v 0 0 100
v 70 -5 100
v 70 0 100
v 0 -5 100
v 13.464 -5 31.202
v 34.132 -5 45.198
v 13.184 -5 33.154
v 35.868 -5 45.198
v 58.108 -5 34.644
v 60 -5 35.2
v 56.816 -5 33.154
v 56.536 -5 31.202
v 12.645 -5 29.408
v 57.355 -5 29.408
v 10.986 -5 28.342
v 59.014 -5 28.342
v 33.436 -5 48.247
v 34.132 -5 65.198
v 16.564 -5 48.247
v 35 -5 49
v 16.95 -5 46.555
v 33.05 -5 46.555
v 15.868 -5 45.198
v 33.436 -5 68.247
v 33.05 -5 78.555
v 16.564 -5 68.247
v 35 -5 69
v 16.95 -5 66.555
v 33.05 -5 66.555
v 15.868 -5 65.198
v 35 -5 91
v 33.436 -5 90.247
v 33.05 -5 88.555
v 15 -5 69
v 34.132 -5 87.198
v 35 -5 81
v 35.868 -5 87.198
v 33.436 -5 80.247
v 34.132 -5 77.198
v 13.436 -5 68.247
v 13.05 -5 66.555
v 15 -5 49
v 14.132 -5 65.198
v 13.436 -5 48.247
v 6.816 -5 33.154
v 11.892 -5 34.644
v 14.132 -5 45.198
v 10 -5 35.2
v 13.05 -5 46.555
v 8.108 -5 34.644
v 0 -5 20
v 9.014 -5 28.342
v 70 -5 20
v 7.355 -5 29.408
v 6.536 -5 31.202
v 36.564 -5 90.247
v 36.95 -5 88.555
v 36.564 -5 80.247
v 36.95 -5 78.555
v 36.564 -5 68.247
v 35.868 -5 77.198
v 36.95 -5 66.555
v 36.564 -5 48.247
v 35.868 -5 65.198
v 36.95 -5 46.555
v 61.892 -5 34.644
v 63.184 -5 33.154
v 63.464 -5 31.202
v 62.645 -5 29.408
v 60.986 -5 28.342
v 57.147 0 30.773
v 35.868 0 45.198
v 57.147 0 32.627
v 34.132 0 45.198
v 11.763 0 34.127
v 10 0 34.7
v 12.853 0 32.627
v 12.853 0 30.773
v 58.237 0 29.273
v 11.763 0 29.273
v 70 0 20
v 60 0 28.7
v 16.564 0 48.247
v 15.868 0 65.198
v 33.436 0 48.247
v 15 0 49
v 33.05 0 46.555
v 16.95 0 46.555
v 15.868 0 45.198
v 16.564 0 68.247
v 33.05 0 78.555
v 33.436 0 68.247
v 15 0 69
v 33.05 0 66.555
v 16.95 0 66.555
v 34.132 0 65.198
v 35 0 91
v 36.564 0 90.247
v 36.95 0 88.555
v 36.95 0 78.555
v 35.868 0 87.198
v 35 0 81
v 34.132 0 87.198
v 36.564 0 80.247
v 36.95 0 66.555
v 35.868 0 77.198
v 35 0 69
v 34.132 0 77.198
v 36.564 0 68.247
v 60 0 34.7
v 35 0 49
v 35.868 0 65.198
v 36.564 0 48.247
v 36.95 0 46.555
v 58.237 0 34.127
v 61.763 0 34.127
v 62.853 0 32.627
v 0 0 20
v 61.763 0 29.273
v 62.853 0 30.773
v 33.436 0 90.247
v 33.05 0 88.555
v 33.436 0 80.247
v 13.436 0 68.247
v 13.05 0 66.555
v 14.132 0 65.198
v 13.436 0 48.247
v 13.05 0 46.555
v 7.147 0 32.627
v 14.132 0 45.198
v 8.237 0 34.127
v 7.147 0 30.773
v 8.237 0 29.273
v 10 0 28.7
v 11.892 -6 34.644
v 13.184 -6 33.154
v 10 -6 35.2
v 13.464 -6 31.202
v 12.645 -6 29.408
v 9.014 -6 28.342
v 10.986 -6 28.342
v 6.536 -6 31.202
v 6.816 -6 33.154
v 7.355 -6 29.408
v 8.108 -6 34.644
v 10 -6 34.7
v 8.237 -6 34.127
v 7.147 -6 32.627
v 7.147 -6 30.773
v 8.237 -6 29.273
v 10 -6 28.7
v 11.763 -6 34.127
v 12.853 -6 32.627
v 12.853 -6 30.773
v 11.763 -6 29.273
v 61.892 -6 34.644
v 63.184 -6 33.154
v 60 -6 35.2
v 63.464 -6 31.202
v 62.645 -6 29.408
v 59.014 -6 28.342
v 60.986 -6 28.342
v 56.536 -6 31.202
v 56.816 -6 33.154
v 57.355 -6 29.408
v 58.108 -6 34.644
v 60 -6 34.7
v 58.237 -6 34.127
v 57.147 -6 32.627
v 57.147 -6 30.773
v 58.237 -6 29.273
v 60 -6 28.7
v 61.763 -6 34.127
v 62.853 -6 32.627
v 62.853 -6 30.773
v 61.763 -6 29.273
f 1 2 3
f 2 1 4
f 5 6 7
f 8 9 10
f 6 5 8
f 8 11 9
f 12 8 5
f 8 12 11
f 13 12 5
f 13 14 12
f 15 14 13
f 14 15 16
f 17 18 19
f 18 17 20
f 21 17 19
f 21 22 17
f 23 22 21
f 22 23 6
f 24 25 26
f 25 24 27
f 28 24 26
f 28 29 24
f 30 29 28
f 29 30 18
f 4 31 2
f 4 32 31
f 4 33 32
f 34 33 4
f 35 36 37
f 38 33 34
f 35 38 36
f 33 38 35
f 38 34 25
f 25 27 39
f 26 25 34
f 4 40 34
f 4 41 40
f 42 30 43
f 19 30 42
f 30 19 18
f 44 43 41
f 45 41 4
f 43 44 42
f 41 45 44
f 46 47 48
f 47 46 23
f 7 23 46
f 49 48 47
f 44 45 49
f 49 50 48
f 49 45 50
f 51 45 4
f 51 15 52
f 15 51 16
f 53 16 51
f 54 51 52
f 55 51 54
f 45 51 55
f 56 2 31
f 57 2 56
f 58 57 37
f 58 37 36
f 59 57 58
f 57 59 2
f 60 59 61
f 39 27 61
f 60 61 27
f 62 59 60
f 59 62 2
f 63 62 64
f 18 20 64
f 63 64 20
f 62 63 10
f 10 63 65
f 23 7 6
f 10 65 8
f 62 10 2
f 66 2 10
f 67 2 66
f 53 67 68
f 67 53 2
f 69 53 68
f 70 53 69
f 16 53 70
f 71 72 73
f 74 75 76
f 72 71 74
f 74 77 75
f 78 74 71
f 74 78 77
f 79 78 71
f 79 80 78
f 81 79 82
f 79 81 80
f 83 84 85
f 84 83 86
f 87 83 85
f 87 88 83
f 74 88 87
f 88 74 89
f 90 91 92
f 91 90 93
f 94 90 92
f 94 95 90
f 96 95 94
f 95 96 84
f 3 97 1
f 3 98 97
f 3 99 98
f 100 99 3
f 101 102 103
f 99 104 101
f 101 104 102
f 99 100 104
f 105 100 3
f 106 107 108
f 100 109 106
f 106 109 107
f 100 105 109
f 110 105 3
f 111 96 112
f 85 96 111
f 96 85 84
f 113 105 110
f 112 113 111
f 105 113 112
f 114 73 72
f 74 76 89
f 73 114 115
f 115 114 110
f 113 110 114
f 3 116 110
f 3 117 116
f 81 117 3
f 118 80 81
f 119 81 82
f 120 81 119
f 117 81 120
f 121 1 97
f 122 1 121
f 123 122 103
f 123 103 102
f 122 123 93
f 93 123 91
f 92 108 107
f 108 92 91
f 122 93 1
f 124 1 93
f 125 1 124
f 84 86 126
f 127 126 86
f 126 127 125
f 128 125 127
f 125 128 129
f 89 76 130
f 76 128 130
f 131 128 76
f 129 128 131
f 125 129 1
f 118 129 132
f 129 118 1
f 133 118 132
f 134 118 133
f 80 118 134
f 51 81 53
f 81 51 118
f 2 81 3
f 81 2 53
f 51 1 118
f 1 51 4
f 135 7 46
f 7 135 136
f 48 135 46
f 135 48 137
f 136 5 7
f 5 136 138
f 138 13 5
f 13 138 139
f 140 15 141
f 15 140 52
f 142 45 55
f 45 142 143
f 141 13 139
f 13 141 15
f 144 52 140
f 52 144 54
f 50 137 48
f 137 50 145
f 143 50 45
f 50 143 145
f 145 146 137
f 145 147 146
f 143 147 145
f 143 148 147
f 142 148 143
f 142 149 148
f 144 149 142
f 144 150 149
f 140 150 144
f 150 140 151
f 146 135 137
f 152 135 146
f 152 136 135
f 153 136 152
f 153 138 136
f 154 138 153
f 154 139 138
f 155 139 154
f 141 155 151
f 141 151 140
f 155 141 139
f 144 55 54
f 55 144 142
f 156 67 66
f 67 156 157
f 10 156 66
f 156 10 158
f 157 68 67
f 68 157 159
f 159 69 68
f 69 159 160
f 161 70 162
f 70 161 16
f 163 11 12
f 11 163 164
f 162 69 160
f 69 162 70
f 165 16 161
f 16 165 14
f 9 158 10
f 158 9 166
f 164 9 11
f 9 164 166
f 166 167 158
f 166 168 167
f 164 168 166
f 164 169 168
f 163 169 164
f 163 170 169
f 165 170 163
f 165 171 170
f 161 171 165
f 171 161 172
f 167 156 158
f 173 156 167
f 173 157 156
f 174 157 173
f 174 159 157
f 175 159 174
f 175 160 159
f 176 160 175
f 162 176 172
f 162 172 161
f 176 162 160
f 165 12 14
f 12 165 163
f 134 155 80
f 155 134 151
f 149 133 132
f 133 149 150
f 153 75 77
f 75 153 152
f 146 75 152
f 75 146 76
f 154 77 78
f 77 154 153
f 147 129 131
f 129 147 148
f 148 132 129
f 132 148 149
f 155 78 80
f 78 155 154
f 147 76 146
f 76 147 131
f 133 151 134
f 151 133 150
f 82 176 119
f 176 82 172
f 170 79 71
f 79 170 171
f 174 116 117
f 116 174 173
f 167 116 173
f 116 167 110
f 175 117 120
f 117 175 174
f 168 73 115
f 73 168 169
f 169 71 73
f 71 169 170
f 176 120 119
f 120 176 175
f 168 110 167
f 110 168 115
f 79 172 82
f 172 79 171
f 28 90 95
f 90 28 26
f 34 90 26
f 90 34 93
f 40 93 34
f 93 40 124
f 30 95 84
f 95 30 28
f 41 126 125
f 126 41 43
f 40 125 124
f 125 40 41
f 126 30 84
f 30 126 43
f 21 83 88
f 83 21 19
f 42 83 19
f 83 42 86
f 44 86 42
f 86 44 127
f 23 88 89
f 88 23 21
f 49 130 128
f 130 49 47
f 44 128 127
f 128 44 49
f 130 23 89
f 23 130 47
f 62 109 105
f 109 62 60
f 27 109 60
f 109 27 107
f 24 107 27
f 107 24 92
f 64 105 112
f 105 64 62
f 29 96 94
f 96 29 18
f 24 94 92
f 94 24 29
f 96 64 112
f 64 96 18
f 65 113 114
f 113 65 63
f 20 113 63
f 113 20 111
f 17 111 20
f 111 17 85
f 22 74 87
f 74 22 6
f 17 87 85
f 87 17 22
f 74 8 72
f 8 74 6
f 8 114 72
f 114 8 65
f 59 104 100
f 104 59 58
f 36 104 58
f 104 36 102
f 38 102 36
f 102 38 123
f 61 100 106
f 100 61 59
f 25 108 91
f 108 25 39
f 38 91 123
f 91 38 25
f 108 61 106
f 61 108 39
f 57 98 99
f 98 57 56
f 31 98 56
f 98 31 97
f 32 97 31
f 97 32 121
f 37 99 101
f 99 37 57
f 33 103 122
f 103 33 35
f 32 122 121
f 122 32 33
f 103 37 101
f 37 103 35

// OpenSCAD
module motorBlock()
{
    // motor holder red side
difference()
{
     
    union() 
    {
        
        
        translate([-42,0,20])
        cube([42,42,5]);
        
        translate([0,-5,-15])
        cube([5,55,40]);
        
    translate([-28,-5,-05])
        cube([30,5,30]);        
        
    
    translate([-42/2-31/2,42/2+31/2,-10])
    roate([0,90,0])    
    cylinder(d=4,h=100);            
    }
    translate([-42/2,42/2,-10])
    cylinder(d=23,h=100);
    
    
    translate([-42/2+31/2,42/2+31/2,-10])
    cylinder(d=4,h=100);    
    
    translate([-42/2+31/2,42/2-31/2,-10])
    cylinder(d=4,h=100);    
    
    translate([-42/2-31/2,42/2-31/2,-10])
    cylinder(d=4,h=100);    
    translate([-42/2-31/2,42/2+31/2,-10])
    cylinder(d=4,h=100);    
    


    translate([-20,10,-13+20])
    rotate([0,90,0])
    cylinder(d=4,h=100);      
    


    translate([-20,10,-13+10])
    rotate([0,90,0])
    cylinder(d=4,h=100);      
    

    
    translate([-20,45,-13+10])
    rotate([0,90,0])
    cylinder(d=4,h=100);    

    translate([-20,25,-13+10])
    rotate([0,90,0])
    cylinder(d=4,h=100);        
    
    translate([-5,-10,0])
    rotate([0,90,90])
    cylinder(d=4,h=100);        

    translate([-5,-10,10])
    rotate([0,90,90])
    cylinder(d=4,h=100);            
   
}

}
module middleBlock()
{
    // red middle block
difference(){
 
union(){    
 translate([20,0,0])
 cube([80,70,5]);
    
 translate([42/2+(9.4/2)+12/2,10,0])
 cylinder(d=7,h=6);           
translate([42/2+(9.4/2)+12/2,60,0])
 cylinder(d=7,h=6);          
    if(false)
    {
translate([20,25,0])    
cube([20,20,5+11]);    
    
translate([20,0,5+11])    
cube([20,70,5]);        
    
    
 translate([42/2+(9.4/2)+12/2,60,10+5])
 cylinder(d=7,h=6);   

 translate([42/2+(9.4/2)+12/2,10,10+5])
 cylinder(d=7,h=6);       
    }
}
     
 translate([42/2+(9.4/2)+12/2,10,-6])
 cylinder(d=6,h=200);       
 translate([42/2+(9.4/2)+12/2,60,-6])
 cylinder(d=6,h=200);       
    
    
    
    
  translate([42-5+20+10,15,-6])   
   cylinder(d=4,h=200);        
    
    translate([42-5+20-10,15,-6])   
   cylinder(d=4,h=200);            
    
    
  translate([42-5+20+10,35,-6])   
   cylinder(d=4,h=200);        
translate([42-5+20-10,35,-6])   
   cylinder(d=4,h=200);            
    
    translate([0+42+5+27+5,35,-8])   
   cylinder(d=4,h=200);                

    translate([0+42+5+27+15,35,-8])   
   cylinder(d=4,h=200);                   
}
}
module redEndRoller()
{
  
    
    difference()
{      
union(){

    
difference(){
 union(){
    
     translate([42/2+(9.4/2)-12/2 ,30,5+10])
     cylinder(d=7,h=6);       
     translate([0,20,5+11])
    cube([42+5,30,5]);         
     
     translate([0,10,0])
  cube([42+5,40,5]);

 translate([42/2+(9.4/2)-12/2 ,30,0])
 cylinder(d=7,h=6);       
     
     
translate([0,45,-20])     
   cube([42+5,5,40]);     
 }
    
 translate([42/2+(9.4/2)-12/2 ,30,-6])
 cylinder(d=6,h=200);   
}   
        
    
    
    translate([42,10,-35])
    cube([5,40,40]);




}
 translate([0,20,-13-10])
 rotate([90,0,90])
 cylinder(d=4,h=200);   

 translate([0,35,-13-10])
 rotate([90,0,90])
 cylinder(d=4,h=200);   


      translate([42+5-10,-200,11])
 rotate([0,90,90])
 cylinder(d=4,h=500); 


    translate([42+5-10,-200,-10])
 rotate([0,90,90])
 cylinder(d=4,h=500); 

}

}

module prism(l, w, h) {
       polyhedron(points=[
               [0,0,h],           // 0    front top corner
               [0,0,0],[w,0,0],   // 1, 2 front left & right bottom corners
               [0,l,h],           // 3    back top corner
               [0,l,0],[w,l,0]    // 4, 5 back left & right bottom corners
       ], faces=[ // points for all faces must be ordered clockwise when looking in
               [0,2,1],    // top face
               [3,4,5],    // base face
               [0,1,4,3],  // h face
               [1,2,5,4],  // w face
               [0,3,5,2],  // hypotenuse face
       ]);
}

module all()
{

color("blue")
translate([20,20,150])
rotate([90,0,90])
prism(20,20,20);


color("blue")
translate([500-20,20,150])
rotate([90,0,180])
prism(20,20,20);

color("blue")
translate([500-20,520,150])
rotate([90,0,-90])
prism(20,20,20);

color("blue")
translate([20,520,150])
rotate([90,0,0])
prism(20,20,20);


translate([-20,0,0])
cube([20,20,300]);

translate([500-0,500+20,0])
cube([20,20,300]);


translate([500-0,-0,0])
cube([20,20,300]);

translate([-20,500+20,0])
cube([20,20,300]);


translate([0,150,150])
rotate([0,0,0])
translate([0,-20,20+13+5])
color("black",1)
cube([500,20,20]);

translate([0,150,150])
rotate([0,0,0])
translate([-5-42,-45,20+13])


middleBlock();


translate([500,150,150])
rotate([0,0,0])
mirror([1,0,0])
translate([-5-42,-45,20+13])


middleBlock();



// red end roller
translate([-0,500-40,150])
rotate([0,0,0])
translate([-5-42,20-10,20+13])
redEndRoller();


// mirrorred red end roller
translate([500,500-40,150])
rotate([0,0,0])
mirror([1,0,0])
translate([-5-42,20-10,20+13])
redEndRoller();


color("green",1)
translate([0,0,150])
cube([500,20,20]);

translate([0,0,150])
rotate([0,0,90])
translate([20,-20,0])
color("red",1)
cube([500,20,20]);
translate([0,0,150+20])
rotate([0,0,90])
translate([20,-20+10-27/2,0])
color("red",0.5)
cube([500,27,13]);
 


translate([500-20,0,150])
rotate([0,0,90])
translate([20,-20,0])
color("violet",1)
cube([500,20,20]);

translate([-20,540,150])
rotate([0,0,0])
translate([20,-20,0])
color("pink",1)
cube([500,20,20]);


    


color("yellow",1)
translate([-5,5+20,150+13])
motorBlock();

color("yellow",1)
translate([500+5,20+5,150+13])
mirror([1,0,0])
motorBlock();


}
/*rotate([0,180,0])
motorBlock();*/
/*rotate([0,90,0])
redEndRoller();*/

/*mirror([1,0,0])
redEndRoller();*/
//all();
rotate([90,180+90+180,0])
mirror([1,0,0])
middleBlock();
